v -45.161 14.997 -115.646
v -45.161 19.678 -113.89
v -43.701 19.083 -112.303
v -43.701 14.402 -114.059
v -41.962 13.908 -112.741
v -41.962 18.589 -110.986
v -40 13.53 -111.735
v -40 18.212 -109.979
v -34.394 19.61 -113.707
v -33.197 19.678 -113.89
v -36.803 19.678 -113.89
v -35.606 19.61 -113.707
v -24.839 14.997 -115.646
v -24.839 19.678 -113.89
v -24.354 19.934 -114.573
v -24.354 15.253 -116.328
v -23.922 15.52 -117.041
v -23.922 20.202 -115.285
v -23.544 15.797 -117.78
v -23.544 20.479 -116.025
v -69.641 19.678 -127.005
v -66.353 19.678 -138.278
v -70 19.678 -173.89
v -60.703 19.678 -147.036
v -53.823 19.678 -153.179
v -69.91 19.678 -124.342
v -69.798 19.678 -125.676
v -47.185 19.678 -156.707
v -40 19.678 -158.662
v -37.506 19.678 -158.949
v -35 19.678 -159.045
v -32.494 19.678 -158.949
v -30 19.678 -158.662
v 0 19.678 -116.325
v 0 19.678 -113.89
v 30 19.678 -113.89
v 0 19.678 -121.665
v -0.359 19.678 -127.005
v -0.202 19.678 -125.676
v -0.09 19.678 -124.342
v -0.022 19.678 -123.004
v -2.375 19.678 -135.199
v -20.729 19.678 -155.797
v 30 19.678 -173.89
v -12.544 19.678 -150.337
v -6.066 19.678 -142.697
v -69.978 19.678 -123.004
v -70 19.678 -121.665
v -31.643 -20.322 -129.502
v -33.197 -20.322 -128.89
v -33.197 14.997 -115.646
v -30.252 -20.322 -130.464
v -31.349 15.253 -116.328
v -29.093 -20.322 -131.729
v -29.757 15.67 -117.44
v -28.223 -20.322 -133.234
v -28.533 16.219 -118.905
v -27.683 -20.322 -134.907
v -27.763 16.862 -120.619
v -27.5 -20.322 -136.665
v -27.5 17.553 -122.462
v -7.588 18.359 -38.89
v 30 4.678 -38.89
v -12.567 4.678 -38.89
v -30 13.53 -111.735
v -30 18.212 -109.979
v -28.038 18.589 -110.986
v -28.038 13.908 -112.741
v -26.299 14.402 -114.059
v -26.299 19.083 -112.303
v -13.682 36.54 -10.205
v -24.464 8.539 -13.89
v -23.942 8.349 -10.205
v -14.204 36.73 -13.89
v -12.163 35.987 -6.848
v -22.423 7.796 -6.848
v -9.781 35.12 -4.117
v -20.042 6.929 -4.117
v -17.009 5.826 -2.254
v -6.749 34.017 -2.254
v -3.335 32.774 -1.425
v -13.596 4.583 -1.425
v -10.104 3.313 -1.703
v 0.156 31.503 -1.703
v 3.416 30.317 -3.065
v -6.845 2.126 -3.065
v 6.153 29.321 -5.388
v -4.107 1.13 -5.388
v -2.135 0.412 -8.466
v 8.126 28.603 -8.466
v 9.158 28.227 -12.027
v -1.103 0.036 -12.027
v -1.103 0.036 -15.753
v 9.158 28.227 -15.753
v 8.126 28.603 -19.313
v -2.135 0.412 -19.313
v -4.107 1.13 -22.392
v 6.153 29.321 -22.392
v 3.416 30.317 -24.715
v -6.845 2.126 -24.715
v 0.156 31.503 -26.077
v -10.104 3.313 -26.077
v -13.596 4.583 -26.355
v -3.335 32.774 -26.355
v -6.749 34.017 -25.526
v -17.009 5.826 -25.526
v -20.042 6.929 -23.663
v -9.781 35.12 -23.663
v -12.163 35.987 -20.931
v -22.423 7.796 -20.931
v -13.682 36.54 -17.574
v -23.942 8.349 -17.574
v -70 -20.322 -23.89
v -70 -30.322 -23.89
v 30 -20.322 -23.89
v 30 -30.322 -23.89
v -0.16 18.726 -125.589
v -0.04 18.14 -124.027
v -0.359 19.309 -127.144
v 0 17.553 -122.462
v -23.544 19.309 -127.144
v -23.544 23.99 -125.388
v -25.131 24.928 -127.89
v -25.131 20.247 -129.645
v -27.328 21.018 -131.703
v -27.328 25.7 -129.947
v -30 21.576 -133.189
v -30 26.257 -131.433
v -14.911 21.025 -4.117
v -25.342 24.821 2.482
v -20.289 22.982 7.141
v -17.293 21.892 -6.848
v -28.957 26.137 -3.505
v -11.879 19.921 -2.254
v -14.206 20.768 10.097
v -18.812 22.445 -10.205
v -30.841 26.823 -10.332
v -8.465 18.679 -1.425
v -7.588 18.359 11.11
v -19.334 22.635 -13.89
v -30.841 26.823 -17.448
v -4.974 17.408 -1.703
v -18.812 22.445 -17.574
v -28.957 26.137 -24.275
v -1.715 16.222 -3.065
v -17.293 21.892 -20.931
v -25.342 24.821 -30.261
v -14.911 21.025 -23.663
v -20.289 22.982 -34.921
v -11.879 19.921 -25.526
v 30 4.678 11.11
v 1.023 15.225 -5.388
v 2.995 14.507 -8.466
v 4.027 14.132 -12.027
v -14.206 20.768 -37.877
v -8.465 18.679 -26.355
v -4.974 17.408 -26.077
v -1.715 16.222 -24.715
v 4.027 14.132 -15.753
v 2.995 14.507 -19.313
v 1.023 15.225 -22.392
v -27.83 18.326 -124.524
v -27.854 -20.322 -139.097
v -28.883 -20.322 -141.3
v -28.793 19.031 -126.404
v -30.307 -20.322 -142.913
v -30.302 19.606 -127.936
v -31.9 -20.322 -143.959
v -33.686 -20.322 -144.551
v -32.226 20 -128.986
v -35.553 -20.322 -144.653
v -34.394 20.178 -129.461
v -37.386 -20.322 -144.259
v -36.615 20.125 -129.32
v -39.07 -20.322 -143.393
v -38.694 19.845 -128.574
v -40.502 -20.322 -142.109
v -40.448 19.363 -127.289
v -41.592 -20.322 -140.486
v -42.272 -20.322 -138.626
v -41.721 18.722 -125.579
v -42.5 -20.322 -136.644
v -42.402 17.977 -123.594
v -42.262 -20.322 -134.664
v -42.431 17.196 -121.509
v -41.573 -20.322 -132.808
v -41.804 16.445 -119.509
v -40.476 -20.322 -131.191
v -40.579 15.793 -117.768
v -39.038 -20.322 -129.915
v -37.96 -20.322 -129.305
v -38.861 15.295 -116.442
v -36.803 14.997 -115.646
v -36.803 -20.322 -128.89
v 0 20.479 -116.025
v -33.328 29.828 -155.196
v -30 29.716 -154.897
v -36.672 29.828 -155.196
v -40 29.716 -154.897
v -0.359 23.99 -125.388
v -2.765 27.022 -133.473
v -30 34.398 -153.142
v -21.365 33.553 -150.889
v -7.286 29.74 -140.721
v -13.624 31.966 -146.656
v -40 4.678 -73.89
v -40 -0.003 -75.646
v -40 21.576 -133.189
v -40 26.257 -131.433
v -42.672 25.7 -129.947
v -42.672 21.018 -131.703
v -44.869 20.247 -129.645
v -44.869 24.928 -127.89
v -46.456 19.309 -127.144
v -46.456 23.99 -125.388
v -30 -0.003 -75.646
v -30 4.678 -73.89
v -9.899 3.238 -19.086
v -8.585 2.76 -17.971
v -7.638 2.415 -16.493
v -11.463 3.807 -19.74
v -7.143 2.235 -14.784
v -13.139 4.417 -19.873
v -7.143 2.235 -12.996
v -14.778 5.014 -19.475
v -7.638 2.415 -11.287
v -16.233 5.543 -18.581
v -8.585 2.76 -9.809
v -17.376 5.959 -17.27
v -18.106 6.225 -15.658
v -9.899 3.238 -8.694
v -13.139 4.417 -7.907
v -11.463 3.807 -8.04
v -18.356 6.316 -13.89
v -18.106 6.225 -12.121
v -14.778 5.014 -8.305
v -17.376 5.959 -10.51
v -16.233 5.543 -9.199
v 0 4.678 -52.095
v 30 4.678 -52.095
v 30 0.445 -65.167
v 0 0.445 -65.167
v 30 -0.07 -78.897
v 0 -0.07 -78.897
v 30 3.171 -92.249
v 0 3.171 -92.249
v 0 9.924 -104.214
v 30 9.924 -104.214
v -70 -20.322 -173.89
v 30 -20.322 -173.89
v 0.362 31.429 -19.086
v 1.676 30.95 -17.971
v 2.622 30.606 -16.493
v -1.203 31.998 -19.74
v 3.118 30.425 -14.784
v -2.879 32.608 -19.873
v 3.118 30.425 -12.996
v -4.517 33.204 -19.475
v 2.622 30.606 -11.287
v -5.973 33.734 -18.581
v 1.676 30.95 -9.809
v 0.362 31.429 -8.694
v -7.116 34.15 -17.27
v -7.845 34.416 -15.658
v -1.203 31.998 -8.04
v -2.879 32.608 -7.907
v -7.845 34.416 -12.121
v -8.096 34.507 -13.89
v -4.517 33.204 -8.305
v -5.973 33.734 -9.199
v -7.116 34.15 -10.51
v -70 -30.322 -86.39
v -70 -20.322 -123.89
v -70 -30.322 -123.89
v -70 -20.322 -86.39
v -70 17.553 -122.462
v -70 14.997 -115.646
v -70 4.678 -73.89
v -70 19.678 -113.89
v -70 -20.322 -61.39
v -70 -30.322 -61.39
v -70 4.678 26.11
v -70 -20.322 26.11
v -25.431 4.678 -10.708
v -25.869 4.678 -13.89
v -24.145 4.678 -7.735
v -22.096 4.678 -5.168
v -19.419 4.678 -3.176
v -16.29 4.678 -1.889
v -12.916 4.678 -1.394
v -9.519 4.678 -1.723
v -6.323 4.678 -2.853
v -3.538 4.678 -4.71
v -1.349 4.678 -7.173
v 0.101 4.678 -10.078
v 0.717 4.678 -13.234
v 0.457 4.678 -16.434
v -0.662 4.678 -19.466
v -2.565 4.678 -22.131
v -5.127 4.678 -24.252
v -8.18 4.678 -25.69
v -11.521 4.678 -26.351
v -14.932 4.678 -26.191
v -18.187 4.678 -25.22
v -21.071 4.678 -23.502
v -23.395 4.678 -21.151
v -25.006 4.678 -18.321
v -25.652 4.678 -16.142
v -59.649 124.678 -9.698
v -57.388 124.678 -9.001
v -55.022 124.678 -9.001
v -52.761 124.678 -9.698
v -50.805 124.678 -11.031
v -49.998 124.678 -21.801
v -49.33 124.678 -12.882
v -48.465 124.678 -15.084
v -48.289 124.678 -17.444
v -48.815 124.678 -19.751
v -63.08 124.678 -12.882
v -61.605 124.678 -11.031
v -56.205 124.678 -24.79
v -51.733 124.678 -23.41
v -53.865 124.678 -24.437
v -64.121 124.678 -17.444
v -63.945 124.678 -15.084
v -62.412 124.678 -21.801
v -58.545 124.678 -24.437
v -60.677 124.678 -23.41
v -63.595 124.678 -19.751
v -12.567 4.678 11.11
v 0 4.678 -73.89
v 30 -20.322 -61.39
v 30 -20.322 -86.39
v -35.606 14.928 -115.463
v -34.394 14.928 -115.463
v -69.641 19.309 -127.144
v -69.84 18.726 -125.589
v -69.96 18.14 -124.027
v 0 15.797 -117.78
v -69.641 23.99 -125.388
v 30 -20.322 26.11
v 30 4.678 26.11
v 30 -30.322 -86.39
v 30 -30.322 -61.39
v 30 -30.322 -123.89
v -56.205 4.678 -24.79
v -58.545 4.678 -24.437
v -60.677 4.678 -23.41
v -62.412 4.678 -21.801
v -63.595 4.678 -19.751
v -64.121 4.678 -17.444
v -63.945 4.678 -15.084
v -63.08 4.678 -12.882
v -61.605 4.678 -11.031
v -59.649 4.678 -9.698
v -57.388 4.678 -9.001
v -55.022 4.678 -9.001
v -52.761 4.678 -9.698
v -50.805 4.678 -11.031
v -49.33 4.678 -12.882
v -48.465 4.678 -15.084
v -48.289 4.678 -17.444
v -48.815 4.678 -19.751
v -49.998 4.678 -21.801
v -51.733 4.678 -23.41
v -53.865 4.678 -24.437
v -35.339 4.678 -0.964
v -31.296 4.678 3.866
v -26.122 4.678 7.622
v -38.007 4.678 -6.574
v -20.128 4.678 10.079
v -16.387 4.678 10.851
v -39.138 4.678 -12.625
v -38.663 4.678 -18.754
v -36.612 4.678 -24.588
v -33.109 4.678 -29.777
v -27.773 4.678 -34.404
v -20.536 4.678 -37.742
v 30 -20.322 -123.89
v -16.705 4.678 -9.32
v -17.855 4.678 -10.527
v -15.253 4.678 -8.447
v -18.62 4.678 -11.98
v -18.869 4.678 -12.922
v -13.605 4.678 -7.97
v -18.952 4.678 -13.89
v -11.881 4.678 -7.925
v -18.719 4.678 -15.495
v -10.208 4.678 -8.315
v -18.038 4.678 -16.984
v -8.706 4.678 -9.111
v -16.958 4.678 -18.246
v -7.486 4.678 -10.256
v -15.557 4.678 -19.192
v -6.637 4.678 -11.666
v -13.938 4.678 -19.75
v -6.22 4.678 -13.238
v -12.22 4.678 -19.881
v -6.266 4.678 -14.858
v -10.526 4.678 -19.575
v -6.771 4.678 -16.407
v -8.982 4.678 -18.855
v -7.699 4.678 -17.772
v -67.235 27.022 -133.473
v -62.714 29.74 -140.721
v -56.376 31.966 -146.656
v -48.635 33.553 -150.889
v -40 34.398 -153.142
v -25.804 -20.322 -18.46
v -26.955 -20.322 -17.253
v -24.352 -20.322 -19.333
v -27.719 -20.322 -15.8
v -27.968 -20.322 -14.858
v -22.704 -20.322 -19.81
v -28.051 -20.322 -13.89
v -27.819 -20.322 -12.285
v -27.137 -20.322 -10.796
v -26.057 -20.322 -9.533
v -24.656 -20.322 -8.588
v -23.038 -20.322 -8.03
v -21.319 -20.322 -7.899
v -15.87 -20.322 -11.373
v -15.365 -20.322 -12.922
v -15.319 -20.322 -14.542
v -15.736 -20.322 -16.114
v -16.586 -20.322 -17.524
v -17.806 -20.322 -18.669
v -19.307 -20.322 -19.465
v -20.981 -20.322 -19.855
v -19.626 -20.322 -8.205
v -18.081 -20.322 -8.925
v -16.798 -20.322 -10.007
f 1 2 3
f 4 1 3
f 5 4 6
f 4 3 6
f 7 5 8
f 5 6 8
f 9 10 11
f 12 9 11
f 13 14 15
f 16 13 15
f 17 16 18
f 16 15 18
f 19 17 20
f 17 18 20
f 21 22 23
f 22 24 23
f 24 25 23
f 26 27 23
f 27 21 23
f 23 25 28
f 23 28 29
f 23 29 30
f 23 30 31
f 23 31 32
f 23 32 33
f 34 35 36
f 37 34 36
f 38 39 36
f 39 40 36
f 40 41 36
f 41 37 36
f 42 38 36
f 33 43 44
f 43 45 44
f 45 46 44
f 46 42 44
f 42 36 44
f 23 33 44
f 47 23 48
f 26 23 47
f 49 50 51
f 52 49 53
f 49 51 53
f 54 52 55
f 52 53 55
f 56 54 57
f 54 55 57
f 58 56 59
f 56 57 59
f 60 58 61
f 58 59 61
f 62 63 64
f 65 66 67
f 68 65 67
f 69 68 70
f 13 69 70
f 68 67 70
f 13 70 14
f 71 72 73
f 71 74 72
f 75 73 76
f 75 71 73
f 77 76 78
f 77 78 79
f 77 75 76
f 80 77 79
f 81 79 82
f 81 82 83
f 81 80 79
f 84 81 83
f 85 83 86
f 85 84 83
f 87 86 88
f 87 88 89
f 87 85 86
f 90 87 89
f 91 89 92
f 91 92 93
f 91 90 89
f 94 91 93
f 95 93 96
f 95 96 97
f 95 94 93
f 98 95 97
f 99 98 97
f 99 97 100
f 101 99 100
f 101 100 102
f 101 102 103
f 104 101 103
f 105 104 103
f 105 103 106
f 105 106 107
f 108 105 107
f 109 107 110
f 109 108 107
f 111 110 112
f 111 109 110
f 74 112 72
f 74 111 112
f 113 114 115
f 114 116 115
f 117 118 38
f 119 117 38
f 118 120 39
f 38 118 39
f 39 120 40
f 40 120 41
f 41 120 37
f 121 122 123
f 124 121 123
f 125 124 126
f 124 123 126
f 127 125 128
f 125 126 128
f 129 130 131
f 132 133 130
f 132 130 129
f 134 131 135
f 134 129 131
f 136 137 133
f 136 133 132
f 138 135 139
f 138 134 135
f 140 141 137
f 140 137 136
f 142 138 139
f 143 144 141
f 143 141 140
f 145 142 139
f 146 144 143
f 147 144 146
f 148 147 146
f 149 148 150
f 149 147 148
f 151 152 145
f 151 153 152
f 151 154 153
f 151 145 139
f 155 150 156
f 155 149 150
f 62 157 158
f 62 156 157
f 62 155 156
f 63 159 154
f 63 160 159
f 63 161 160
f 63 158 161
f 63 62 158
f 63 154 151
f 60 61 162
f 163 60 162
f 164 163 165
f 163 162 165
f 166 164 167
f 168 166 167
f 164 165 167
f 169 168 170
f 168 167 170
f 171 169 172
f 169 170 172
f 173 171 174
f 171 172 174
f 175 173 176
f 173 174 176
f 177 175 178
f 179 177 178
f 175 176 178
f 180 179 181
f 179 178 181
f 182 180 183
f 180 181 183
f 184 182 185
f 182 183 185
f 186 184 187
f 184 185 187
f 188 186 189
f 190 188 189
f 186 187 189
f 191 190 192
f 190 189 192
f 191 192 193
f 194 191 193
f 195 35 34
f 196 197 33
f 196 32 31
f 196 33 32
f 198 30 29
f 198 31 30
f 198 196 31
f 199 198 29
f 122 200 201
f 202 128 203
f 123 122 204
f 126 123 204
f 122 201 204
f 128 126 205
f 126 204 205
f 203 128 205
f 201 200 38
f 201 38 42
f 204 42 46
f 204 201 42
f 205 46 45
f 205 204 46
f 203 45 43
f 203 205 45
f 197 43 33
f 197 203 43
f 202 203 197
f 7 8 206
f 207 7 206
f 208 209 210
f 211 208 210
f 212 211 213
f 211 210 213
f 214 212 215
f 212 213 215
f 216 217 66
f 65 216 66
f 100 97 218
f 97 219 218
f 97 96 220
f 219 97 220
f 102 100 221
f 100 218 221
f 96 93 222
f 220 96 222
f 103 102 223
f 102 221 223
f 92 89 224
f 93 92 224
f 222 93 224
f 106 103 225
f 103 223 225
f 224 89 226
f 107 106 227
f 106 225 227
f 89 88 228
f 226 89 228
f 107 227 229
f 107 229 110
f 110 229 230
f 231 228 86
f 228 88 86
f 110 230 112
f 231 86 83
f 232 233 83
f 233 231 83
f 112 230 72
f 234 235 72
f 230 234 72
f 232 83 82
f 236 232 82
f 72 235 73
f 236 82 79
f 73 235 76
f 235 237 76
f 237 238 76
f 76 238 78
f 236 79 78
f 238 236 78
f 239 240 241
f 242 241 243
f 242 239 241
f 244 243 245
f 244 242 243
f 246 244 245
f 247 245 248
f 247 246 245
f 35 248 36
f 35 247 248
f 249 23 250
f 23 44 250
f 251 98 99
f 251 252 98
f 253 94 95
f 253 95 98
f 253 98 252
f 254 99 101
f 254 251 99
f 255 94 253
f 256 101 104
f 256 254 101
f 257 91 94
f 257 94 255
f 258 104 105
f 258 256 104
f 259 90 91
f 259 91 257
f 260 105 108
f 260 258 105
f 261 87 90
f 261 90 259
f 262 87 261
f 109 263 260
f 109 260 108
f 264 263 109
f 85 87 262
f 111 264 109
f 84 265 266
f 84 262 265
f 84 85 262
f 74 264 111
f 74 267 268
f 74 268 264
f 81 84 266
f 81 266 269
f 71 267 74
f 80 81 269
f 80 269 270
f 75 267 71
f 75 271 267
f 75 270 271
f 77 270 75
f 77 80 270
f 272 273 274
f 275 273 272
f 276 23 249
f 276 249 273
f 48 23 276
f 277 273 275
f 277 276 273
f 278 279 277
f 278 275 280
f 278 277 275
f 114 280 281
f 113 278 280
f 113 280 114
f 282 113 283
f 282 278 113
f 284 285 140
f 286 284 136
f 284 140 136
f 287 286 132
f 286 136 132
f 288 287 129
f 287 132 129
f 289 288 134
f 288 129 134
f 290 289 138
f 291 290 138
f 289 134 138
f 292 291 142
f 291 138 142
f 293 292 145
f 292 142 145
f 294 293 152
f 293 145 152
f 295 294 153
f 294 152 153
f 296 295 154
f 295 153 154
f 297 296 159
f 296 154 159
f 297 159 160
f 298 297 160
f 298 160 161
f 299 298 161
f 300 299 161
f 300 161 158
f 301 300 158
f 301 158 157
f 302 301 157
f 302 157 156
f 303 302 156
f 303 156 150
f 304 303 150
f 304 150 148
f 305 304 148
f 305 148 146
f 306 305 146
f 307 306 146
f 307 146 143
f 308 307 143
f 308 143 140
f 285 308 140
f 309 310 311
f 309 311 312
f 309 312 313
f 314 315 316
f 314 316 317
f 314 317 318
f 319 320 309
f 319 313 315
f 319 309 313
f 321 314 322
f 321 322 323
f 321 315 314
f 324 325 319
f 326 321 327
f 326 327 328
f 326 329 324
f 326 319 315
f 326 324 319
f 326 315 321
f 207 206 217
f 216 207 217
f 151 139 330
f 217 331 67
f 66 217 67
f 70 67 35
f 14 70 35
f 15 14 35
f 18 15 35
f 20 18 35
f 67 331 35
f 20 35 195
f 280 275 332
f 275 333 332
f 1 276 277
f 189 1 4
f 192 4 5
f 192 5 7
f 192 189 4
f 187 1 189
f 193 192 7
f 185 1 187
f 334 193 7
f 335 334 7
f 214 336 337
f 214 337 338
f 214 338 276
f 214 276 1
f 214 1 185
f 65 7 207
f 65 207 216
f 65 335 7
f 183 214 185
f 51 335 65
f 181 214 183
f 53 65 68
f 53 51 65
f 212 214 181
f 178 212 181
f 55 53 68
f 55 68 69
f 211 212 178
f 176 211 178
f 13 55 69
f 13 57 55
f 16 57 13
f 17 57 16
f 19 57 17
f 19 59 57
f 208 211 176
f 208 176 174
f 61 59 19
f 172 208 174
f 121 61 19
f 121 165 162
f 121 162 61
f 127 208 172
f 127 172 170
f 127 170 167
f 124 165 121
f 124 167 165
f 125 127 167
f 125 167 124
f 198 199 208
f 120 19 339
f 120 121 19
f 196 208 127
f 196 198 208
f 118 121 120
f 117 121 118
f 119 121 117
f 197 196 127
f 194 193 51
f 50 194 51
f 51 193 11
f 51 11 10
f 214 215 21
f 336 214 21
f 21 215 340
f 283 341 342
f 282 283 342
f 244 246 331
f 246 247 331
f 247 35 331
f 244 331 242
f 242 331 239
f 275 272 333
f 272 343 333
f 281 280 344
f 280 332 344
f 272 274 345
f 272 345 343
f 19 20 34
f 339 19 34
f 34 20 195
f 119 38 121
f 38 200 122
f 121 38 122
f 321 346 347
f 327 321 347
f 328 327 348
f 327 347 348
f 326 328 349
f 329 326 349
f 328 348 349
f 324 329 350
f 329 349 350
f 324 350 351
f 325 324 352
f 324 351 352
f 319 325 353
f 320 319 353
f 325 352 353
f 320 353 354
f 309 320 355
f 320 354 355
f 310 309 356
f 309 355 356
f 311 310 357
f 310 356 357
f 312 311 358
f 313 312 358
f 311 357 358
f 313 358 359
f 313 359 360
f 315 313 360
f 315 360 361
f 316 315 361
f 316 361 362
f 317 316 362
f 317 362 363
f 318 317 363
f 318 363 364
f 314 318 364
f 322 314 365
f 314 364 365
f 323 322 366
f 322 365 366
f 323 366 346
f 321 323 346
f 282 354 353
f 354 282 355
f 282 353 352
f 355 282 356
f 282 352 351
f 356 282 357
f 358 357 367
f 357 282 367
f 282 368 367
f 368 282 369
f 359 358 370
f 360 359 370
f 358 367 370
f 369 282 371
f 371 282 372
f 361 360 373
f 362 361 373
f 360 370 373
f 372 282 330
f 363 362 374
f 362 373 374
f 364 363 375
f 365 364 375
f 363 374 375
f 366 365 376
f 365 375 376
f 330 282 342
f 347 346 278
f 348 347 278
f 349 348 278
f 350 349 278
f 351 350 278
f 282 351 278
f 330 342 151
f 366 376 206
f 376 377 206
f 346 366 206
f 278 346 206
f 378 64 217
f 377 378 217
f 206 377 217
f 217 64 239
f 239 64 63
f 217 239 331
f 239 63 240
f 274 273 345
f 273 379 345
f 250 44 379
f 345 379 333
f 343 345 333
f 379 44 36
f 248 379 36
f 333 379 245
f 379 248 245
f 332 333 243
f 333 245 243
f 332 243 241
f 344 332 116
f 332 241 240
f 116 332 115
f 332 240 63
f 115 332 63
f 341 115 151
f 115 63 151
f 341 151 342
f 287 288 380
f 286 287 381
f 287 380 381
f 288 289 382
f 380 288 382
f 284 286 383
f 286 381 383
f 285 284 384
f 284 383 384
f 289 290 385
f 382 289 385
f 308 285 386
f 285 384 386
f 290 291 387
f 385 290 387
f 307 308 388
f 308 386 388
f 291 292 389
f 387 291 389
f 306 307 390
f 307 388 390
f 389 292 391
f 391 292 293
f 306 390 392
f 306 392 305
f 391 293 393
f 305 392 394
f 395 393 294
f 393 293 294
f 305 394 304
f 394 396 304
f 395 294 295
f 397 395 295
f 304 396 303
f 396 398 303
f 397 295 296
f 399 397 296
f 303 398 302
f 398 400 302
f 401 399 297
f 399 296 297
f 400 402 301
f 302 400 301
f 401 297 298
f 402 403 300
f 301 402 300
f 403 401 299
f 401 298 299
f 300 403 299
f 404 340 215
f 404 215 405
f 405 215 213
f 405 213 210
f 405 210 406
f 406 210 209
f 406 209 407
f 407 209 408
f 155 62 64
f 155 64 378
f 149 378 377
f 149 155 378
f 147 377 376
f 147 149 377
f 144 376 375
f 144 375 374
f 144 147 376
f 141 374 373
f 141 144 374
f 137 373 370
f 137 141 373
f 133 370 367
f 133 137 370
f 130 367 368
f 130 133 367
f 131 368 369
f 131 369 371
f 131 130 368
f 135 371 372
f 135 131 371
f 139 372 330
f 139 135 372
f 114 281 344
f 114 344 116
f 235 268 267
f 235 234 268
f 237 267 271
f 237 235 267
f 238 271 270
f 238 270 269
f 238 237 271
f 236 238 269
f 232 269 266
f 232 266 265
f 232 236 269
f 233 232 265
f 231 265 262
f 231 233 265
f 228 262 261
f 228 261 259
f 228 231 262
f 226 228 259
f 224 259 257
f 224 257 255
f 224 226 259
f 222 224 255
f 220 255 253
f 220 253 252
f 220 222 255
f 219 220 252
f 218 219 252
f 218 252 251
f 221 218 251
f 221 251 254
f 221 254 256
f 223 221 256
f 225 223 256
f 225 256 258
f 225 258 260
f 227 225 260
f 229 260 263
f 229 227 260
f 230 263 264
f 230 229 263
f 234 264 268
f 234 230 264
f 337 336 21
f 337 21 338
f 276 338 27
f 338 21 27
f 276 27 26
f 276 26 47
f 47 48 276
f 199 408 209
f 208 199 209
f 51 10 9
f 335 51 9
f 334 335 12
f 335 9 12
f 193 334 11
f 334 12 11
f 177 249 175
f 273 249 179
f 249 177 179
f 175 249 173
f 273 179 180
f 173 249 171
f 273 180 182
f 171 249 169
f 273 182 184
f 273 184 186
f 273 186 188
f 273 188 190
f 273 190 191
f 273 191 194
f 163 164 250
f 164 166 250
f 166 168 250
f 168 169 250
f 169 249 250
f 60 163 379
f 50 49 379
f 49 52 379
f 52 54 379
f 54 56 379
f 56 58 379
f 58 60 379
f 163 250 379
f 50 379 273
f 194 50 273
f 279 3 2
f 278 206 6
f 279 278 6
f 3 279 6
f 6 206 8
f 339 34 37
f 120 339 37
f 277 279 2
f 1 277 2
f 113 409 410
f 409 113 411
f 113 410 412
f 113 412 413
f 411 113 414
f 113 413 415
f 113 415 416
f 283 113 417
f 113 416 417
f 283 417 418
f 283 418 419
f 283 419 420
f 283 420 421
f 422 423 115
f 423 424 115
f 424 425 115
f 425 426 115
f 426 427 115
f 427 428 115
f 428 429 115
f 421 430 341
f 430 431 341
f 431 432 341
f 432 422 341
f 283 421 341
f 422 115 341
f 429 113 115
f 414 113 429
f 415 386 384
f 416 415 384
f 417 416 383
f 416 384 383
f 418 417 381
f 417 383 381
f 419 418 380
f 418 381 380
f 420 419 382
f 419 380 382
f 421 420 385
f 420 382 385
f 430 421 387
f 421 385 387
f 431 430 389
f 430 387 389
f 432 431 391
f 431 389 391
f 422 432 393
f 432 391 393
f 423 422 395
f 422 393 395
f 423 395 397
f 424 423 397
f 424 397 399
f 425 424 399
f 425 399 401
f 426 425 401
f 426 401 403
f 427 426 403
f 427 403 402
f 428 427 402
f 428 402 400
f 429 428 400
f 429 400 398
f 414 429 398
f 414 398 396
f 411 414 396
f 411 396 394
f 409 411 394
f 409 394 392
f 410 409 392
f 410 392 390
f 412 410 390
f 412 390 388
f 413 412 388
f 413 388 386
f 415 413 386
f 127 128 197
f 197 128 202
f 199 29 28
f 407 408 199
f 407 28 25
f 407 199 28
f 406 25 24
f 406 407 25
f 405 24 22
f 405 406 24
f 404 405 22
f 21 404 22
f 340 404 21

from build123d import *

# Parameters (mm, degrees)
BOSS_EXTRUDE1_DEPTH = 30
BOSS_EXTRUDE2_DEPTH = 70
BOSS_EXTRUDE4_DEPTH = 25
SKETCH3_10_R        = 7.5
CUT_EXTRUDE3_DEPTH  = 5
CUT_EXTRUDE4_DEPTH  = 189.525149763
BOSS_EXTRUDE5_REACH = 196.445
SKETCH10_R          = 12.5
SKETCH10_3_R        = 12.5
SKETCH10_3_R_2      = 6
BOSS_EXTRUDE6_DEPTH = 15
SKETCH10_4_R        = 6
CUT_EXTRUDE5_DEPTH  = 195.445323253
SKETCH11_R          = 7.938683864
BOSS_EXTRUDE7_DEPTH = 120


with BuildPart() as part:
    # Sketch1 → Boss-Extrude1 (new body)
    with BuildSketch(Plane(origin=(0, 0, 0), x_dir=(0, 0, -1), z_dir=(1, 0, 0))):
        with BuildLine():
            Line((173.889938751, 19.67846657), (173.889938751, -20.32153343))
            Line((173.889938751, -20.32153343), (123.889938751, -20.32153343))
            Line((123.889938751, -20.32153343), (123.889938751, -30.32153343))
            Line((123.889938751, -30.32153343), (86.389938751, -30.32153343))
            Line((86.389938751, -30.32153343), (86.389938751, -20.32153343))
            Line((86.389938751, -20.32153343), (61.389938751, -20.32153343))
            Line((61.389938751, -20.32153343), (61.389938751, -30.32153343))
            Line((61.389938751, -30.32153343), (23.889938751, -30.32153343))
            Line((23.889938751, -30.32153343), (23.889938751, -20.32153343))
            Line((23.889938751, -20.32153343), (-26.110061249, -20.32153343))
            Line((-26.110061249, -20.32153343), (-26.110061249, 4.67846657))
            Line((-26.110061249, 4.67846657), (52.095444034, 4.67846657))
            ThreePointArc((52.095444034, 4.67846657), (85.684433469, 1.089477135), (113.889938751, 19.67846657))
            Line((113.889938751, 19.67846657), (173.889938751, 19.67846657))
        make_face()
    extrude(amount=BOSS_EXTRUDE1_DEPTH)

    # Sketch2 → Boss-Extrude2 (add)
    with BuildSketch(Plane.ZY):
        Polygon((26.110061249, 4.67846657), (-73.889938751, 4.67846657), (-113.889938751, 19.67846657), (-173.889938751, 19.67846657), (-173.889938751, -20.32153343), (-123.889938751, -20.32153343), (-123.889938751, -30.32153343), (-86.389938751, -30.32153343), (-86.389938751, -20.32153343), (-61.389938751, -20.32153343), (-61.389938751, -30.32153343), (-23.889938751, -30.32153343), (-23.889938751, -20.32153343), (26.110061249, -20.32153343), align=None)
    extrude(amount=BOSS_EXTRUDE2_DEPTH)

    # Sketch3 → Boss-Extrude4 (add)
    with BuildSketch(Plane(origin=(0, -20.190913281, -7.571592481), x_dir=(1, 0, 0), z_dir=(0, 0.9363291775690461, 0.35112344158838765))):
        with BuildLine():
            Line((-70, 120.828024865), (-70, 70.828024865))
            Line((-70, 70.828024865), (0, 70.828024865))
            Line((0, 70.828024865), (0, 120.828024865))
            ThreePointArc((0, 120.828024865), (-35, 155.828024865), (-70, 120.828024865))
        make_face()
        with BuildLine():
            ThreePointArc((-33.196705055, 113.548043592), (-35, 113.328024865), (-36.803294945, 113.548043592))
            Line((-36.803294945, 113.548043592), (-33.196705055, 113.548043592))
        make_face(mode=Mode.SUBTRACT)
    extrude(amount=-BOSS_EXTRUDE4_DEPTH)

    # Sketch3<10> → Cut-Extrude3 (cut)
    with BuildSketch(Plane(origin=(0, -20.190913281, -7.571592481), x_dir=(1, 0, 0), z_dir=(0, 0.9363291775690461, 0.35112344158838765))):
        with BuildLine():
            Line((-70, 120.828024865), (-70, 113.548043592))
            Line((-70, 113.548043592), (-45.161292864, 113.548043592))
            ThreePointArc((-45.161292864, 113.548043592), (-42.863008369, 111.110869963), (-40, 109.371585628))
            Line((-40, 109.371585628), (-40, 70.828024865))
            Line((-40, 70.828024865), (-30, 70.828024865))
            Line((-30, 70.828024865), (-30, 109.371585628))
            ThreePointArc((-30, 109.371585628), (-26.161165235, 111.9891901), (-23.543560763, 115.828024865))
            Line((-23.543560763, 115.828024865), (0, 115.828024865))
            Line((0, 115.828024865), (0, 120.828024865))
            ThreePointArc((0, 120.828024865), (-0.08986132, 123.334460053), (-0.358983849, 125.828024865))
            Line((-0.358983849, 125.828024865), (-23.543560763, 125.828024865))
            ThreePointArc((-23.543560763, 125.828024865), (-26.161165235, 129.66685963), (-30, 132.284464103))
            Line((-30, 132.284464103), (-30, 155.469041017))
            ThreePointArc((-30, 155.469041017), (-35, 155.828024865), (-40, 155.469041017))
            Line((-40, 155.469041017), (-40, 132.284464103))
            ThreePointArc((-40, 132.284464103), (-43.838834765, 129.66685963), (-46.456439237, 125.828024865))
            Line((-46.456439237, 125.828024865), (-69.641016151, 125.828024865))
            ThreePointArc((-69.641016151, 125.828024865), (-69.91013868, 123.334460053), (-70, 120.828024865))
        make_face()
        with Locations((-35, 120.828024865)):
            Circle(SKETCH3_10_R, mode=Mode.SUBTRACT)
    extrude(amount=-CUT_EXTRUDE3_DEPTH, mode=Mode.SUBTRACT)

    # Sketch3<11> → Cut-Extrude4 (cut, through all)
    with BuildSketch(Plane(origin=(0, -20.190913281, -7.571592481), x_dir=(1, 0, 0), z_dir=(0, 0.9363291775690461, 0.35112344158838765))):
        with BuildLine():
            ThreePointArc((-27.5, 120.828024865), (-39.621974032, 126.734576824), (-36.803294945, 113.548043592))
            Line((-36.803294945, 113.548043592), (-33.196705055, 113.548043592))
            ThreePointArc((-33.196705055, 113.548043592), (-29.093448041, 116.206050833), (-27.5, 120.828024865))
        make_face()
    extrude(amount=-CUT_EXTRUDE4_DEPTH, mode=Mode.SUBTRACT)

    # Boss-Extrude5: up to this face of the body (flat: up to its plane)
    boss_extrude5_end = Plane(part.part.faces().sort_by_distance((-22.448514344, 4.67846657, -21.154405873))[0])
    # Sketch10 → Boss-Extrude5 (add, up to the picked face)
    with BuildSketch(Plane(origin=(5.012963525, 13.77300409, 0), x_dir=(0.9396926207859082, -0.3420201433256694, 0), z_dir=(0.3420201433256694, 0.9396926207859083, 0)), mode=Mode.PRIVATE) as boss_extrude5_sk1:
        with BuildLine():
            Line((-13.409351183, -11.110061249), (26.590648817, -11.110061249))
            Line((26.590648817, -11.110061249), (26.590648817, 38.889938751))
            Line((26.590648817, 38.889938751), (-13.409351183, 38.889938751))
            ThreePointArc((-13.409351183, 38.889938751), (-38.409351183, 13.889938751), (-13.409351183, -11.110061249))
        make_face()
        with Locations((-13.409351183, 13.889938751)):
            Circle(SKETCH10_R, mode=Mode.SUBTRACT)
    boss_extrude5_tool1 = split(extrude(boss_extrude5_sk1.sketch, amount=-BOSS_EXTRUDE5_REACH, mode=Mode.PRIVATE), bisect_by=boss_extrude5_end, keep=Keep.BOTH, mode=Mode.PRIVATE)
    add(boss_extrude5_tool1.solids().sort_by(Axis((-30.309415, 26.629299, -13.889939), (-0.3420201433256694, -0.9396926207859083, 0)))[0])

    # Sketch10<4> → Cut-Extrude5 (cut, through all)
    with BuildSketch(Plane(origin=(5.012963525, 13.77300409, 0), x_dir=(0.9396926207859082, -0.3420201433256694, 0), z_dir=(0.3420201433256694, 0.9396926207859083, 0))):
        with Locations((-13.409351183, 13.889938751)):
            Circle(SKETCH10_4_R)
    extrude(amount=-CUT_EXTRUDE5_DEPTH, mode=Mode.SUBTRACT)

    # Sketch11 → Boss-Extrude7 (add)
    with BuildSketch(Plane(origin=(0, 4.67846657, 0), x_dir=(1, 0, 0), z_dir=(0, 1, 0))):
        with Locations((-56.205003801, 16.850900171)):
            Circle(SKETCH11_R)
    extrude(amount=BOSS_EXTRUDE7_DEPTH)


with BuildPart() as body_2:
    # Sketch10<3> → Boss-Extrude6 (new, symmetric)
    with BuildSketch(Plane(origin=(5.012963525, 13.77300409, 0), x_dir=(0.9396926207859082, -0.3420201433256694, 0), z_dir=(0.3420201433256694, 0.9396926207859083, 0))):
        with Locations((-13.409351183, 13.889938751)):
            Circle(SKETCH10_3_R)
        with Locations((-13.409351183, 13.889938751)):
            Circle(SKETCH10_3_R_2, mode=Mode.SUBTRACT)
    extrude(amount=BOSS_EXTRUDE6_DEPTH, both=True)


solid = Compound([part.part, body_2.part])
